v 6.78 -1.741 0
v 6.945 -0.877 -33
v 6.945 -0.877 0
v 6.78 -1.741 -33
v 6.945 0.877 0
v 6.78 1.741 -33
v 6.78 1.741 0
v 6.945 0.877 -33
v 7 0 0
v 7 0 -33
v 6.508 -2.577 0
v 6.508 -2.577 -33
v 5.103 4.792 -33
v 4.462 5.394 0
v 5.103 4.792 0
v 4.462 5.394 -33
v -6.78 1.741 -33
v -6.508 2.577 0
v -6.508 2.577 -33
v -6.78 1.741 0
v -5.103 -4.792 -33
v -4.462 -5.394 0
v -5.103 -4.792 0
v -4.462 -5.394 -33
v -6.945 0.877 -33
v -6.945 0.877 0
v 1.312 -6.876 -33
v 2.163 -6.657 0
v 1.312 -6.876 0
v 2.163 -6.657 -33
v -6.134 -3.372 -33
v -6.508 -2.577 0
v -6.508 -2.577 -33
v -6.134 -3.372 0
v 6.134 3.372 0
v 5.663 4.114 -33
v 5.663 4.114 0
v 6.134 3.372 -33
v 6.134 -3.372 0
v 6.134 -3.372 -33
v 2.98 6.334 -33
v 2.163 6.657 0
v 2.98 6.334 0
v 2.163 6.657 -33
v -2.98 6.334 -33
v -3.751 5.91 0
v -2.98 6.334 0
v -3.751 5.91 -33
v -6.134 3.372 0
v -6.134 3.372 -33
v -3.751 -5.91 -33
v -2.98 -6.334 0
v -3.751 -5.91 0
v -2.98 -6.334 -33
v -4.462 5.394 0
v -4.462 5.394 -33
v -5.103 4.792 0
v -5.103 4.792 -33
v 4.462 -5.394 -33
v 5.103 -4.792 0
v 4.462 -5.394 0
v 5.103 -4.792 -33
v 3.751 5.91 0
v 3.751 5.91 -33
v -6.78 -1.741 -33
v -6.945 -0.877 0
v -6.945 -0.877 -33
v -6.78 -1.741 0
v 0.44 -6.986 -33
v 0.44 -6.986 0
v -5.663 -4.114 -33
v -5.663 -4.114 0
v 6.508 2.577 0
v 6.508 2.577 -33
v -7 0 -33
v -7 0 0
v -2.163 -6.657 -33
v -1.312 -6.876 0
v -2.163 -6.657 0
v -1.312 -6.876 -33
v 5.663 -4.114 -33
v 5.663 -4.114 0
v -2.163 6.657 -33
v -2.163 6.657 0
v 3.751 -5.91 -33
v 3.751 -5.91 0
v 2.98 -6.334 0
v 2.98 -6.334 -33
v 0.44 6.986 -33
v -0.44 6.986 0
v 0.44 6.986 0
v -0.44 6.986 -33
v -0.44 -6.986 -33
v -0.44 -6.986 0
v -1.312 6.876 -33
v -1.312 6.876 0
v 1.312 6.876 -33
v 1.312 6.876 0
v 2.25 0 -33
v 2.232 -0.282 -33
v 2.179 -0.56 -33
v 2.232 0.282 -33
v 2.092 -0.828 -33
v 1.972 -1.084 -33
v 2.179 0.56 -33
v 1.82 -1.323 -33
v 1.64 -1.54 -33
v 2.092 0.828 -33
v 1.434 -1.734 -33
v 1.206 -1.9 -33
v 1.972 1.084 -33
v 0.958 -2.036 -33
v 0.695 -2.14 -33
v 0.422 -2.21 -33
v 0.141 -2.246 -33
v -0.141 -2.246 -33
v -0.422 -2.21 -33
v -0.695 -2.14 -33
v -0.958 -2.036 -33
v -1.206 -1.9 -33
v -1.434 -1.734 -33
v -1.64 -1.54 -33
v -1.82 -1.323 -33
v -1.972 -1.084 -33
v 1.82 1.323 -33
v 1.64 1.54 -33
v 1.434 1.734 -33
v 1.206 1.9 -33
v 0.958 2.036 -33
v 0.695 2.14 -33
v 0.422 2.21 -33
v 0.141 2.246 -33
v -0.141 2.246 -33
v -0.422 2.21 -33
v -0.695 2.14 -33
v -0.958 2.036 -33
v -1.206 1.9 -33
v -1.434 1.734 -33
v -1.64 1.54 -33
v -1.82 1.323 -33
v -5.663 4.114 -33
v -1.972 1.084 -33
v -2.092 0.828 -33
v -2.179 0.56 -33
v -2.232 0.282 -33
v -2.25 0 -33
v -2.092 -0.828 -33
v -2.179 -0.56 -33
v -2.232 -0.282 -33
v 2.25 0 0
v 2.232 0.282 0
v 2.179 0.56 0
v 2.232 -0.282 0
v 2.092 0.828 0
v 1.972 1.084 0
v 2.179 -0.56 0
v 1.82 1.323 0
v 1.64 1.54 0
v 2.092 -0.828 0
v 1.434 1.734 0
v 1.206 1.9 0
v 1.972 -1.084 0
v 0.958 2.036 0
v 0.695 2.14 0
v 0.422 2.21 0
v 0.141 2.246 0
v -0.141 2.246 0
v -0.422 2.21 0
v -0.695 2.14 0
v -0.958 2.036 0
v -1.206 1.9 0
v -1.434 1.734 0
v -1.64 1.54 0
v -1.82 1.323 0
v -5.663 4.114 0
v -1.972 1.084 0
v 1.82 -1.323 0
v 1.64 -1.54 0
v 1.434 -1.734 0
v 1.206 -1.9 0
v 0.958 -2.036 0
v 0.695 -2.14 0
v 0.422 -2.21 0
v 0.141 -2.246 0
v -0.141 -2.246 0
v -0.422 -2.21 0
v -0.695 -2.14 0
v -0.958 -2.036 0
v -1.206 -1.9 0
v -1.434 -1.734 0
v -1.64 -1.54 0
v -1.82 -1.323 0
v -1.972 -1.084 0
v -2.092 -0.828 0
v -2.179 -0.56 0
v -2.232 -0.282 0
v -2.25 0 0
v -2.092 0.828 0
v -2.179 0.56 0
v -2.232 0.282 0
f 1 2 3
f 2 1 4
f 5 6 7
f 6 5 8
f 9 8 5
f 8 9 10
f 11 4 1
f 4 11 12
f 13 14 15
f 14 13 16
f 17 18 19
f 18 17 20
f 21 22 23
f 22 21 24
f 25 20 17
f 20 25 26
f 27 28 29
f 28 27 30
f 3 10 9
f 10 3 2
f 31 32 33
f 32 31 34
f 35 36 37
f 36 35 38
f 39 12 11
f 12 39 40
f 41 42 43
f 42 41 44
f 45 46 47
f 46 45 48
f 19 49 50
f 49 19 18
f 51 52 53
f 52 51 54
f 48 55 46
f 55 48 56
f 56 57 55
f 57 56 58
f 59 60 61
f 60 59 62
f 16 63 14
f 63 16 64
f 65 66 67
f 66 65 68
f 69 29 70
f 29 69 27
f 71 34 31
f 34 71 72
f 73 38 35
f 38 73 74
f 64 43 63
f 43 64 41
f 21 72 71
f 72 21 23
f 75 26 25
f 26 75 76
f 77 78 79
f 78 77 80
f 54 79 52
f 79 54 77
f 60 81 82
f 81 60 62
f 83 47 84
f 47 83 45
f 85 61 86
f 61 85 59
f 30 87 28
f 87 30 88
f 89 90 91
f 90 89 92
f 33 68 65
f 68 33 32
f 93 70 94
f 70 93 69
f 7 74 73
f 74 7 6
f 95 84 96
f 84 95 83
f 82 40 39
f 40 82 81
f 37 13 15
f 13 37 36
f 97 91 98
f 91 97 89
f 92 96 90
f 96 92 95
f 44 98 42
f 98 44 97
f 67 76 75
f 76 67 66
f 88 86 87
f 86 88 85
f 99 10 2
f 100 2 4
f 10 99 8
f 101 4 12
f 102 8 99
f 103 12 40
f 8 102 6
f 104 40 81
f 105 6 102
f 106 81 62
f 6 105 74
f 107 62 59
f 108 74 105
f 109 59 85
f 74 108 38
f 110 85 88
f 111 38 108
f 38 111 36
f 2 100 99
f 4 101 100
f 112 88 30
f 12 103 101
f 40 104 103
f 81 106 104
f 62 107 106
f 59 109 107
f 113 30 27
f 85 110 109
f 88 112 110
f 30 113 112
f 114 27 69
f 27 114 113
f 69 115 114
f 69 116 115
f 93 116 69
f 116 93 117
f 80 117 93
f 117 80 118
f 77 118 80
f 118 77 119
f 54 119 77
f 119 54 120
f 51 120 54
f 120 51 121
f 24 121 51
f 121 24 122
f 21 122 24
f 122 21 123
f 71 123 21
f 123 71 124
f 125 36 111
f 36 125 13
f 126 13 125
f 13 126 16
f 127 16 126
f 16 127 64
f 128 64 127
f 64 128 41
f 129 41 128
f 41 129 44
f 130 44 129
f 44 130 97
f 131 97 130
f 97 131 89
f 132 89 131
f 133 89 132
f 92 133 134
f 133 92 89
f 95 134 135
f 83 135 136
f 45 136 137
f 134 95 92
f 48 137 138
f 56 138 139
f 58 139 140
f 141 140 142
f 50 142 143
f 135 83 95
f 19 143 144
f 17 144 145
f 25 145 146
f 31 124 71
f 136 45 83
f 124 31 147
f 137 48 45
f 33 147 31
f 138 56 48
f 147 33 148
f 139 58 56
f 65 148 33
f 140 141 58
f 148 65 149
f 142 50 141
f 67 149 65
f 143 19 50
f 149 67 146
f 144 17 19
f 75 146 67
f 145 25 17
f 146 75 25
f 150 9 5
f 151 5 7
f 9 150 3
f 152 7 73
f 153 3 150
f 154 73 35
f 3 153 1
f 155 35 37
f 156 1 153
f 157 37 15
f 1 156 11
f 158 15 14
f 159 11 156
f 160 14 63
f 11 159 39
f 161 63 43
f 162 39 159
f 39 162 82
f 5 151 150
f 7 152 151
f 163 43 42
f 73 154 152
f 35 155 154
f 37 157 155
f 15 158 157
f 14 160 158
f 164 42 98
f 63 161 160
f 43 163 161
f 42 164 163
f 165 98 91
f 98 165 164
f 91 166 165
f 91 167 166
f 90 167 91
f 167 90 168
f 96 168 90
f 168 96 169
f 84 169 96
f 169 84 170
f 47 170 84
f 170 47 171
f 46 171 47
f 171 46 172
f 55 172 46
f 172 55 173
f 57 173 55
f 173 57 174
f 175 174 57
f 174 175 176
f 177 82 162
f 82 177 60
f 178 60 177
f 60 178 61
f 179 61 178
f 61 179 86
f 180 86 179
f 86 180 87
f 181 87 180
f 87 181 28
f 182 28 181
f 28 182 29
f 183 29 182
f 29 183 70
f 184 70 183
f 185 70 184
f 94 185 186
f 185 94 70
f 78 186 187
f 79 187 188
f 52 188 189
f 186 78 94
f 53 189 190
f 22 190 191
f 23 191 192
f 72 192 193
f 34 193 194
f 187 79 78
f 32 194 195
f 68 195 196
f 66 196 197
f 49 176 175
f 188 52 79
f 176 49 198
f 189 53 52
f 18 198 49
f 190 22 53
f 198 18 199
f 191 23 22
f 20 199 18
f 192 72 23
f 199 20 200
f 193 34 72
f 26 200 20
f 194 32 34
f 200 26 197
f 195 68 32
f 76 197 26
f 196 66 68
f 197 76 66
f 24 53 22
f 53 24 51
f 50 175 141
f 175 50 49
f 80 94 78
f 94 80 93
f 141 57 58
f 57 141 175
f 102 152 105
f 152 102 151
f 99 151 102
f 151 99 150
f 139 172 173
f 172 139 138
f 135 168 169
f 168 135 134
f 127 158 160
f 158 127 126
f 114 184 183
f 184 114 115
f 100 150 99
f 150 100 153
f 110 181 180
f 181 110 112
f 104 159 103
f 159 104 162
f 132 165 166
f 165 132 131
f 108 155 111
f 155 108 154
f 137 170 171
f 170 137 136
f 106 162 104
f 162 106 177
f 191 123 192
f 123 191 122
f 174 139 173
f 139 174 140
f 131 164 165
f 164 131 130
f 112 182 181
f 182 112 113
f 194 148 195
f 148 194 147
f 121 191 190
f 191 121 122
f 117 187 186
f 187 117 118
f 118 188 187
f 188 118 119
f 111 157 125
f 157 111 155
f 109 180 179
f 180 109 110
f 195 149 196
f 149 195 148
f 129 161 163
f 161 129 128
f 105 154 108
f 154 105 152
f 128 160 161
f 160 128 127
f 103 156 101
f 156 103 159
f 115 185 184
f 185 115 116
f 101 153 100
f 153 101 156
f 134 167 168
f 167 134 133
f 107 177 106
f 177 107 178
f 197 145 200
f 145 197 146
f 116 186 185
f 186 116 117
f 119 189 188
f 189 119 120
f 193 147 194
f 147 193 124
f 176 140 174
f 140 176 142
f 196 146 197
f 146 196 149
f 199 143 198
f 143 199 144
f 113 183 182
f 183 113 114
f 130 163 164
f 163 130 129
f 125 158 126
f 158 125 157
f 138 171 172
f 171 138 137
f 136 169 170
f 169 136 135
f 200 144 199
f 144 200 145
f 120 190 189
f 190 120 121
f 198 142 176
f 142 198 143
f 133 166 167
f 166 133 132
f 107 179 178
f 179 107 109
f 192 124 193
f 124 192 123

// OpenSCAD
$fn = 50;


difference() {
	union() {
		translate(v = [0, 0, -33.0000000000]) {
			cylinder(h = 33, r = 7.0000000000);
		}
	}
	union() {
		#translate(v = [0, 0, -33]) {
			cylinder(h = 33, r = 2.2500000000);
		}
	}
}
